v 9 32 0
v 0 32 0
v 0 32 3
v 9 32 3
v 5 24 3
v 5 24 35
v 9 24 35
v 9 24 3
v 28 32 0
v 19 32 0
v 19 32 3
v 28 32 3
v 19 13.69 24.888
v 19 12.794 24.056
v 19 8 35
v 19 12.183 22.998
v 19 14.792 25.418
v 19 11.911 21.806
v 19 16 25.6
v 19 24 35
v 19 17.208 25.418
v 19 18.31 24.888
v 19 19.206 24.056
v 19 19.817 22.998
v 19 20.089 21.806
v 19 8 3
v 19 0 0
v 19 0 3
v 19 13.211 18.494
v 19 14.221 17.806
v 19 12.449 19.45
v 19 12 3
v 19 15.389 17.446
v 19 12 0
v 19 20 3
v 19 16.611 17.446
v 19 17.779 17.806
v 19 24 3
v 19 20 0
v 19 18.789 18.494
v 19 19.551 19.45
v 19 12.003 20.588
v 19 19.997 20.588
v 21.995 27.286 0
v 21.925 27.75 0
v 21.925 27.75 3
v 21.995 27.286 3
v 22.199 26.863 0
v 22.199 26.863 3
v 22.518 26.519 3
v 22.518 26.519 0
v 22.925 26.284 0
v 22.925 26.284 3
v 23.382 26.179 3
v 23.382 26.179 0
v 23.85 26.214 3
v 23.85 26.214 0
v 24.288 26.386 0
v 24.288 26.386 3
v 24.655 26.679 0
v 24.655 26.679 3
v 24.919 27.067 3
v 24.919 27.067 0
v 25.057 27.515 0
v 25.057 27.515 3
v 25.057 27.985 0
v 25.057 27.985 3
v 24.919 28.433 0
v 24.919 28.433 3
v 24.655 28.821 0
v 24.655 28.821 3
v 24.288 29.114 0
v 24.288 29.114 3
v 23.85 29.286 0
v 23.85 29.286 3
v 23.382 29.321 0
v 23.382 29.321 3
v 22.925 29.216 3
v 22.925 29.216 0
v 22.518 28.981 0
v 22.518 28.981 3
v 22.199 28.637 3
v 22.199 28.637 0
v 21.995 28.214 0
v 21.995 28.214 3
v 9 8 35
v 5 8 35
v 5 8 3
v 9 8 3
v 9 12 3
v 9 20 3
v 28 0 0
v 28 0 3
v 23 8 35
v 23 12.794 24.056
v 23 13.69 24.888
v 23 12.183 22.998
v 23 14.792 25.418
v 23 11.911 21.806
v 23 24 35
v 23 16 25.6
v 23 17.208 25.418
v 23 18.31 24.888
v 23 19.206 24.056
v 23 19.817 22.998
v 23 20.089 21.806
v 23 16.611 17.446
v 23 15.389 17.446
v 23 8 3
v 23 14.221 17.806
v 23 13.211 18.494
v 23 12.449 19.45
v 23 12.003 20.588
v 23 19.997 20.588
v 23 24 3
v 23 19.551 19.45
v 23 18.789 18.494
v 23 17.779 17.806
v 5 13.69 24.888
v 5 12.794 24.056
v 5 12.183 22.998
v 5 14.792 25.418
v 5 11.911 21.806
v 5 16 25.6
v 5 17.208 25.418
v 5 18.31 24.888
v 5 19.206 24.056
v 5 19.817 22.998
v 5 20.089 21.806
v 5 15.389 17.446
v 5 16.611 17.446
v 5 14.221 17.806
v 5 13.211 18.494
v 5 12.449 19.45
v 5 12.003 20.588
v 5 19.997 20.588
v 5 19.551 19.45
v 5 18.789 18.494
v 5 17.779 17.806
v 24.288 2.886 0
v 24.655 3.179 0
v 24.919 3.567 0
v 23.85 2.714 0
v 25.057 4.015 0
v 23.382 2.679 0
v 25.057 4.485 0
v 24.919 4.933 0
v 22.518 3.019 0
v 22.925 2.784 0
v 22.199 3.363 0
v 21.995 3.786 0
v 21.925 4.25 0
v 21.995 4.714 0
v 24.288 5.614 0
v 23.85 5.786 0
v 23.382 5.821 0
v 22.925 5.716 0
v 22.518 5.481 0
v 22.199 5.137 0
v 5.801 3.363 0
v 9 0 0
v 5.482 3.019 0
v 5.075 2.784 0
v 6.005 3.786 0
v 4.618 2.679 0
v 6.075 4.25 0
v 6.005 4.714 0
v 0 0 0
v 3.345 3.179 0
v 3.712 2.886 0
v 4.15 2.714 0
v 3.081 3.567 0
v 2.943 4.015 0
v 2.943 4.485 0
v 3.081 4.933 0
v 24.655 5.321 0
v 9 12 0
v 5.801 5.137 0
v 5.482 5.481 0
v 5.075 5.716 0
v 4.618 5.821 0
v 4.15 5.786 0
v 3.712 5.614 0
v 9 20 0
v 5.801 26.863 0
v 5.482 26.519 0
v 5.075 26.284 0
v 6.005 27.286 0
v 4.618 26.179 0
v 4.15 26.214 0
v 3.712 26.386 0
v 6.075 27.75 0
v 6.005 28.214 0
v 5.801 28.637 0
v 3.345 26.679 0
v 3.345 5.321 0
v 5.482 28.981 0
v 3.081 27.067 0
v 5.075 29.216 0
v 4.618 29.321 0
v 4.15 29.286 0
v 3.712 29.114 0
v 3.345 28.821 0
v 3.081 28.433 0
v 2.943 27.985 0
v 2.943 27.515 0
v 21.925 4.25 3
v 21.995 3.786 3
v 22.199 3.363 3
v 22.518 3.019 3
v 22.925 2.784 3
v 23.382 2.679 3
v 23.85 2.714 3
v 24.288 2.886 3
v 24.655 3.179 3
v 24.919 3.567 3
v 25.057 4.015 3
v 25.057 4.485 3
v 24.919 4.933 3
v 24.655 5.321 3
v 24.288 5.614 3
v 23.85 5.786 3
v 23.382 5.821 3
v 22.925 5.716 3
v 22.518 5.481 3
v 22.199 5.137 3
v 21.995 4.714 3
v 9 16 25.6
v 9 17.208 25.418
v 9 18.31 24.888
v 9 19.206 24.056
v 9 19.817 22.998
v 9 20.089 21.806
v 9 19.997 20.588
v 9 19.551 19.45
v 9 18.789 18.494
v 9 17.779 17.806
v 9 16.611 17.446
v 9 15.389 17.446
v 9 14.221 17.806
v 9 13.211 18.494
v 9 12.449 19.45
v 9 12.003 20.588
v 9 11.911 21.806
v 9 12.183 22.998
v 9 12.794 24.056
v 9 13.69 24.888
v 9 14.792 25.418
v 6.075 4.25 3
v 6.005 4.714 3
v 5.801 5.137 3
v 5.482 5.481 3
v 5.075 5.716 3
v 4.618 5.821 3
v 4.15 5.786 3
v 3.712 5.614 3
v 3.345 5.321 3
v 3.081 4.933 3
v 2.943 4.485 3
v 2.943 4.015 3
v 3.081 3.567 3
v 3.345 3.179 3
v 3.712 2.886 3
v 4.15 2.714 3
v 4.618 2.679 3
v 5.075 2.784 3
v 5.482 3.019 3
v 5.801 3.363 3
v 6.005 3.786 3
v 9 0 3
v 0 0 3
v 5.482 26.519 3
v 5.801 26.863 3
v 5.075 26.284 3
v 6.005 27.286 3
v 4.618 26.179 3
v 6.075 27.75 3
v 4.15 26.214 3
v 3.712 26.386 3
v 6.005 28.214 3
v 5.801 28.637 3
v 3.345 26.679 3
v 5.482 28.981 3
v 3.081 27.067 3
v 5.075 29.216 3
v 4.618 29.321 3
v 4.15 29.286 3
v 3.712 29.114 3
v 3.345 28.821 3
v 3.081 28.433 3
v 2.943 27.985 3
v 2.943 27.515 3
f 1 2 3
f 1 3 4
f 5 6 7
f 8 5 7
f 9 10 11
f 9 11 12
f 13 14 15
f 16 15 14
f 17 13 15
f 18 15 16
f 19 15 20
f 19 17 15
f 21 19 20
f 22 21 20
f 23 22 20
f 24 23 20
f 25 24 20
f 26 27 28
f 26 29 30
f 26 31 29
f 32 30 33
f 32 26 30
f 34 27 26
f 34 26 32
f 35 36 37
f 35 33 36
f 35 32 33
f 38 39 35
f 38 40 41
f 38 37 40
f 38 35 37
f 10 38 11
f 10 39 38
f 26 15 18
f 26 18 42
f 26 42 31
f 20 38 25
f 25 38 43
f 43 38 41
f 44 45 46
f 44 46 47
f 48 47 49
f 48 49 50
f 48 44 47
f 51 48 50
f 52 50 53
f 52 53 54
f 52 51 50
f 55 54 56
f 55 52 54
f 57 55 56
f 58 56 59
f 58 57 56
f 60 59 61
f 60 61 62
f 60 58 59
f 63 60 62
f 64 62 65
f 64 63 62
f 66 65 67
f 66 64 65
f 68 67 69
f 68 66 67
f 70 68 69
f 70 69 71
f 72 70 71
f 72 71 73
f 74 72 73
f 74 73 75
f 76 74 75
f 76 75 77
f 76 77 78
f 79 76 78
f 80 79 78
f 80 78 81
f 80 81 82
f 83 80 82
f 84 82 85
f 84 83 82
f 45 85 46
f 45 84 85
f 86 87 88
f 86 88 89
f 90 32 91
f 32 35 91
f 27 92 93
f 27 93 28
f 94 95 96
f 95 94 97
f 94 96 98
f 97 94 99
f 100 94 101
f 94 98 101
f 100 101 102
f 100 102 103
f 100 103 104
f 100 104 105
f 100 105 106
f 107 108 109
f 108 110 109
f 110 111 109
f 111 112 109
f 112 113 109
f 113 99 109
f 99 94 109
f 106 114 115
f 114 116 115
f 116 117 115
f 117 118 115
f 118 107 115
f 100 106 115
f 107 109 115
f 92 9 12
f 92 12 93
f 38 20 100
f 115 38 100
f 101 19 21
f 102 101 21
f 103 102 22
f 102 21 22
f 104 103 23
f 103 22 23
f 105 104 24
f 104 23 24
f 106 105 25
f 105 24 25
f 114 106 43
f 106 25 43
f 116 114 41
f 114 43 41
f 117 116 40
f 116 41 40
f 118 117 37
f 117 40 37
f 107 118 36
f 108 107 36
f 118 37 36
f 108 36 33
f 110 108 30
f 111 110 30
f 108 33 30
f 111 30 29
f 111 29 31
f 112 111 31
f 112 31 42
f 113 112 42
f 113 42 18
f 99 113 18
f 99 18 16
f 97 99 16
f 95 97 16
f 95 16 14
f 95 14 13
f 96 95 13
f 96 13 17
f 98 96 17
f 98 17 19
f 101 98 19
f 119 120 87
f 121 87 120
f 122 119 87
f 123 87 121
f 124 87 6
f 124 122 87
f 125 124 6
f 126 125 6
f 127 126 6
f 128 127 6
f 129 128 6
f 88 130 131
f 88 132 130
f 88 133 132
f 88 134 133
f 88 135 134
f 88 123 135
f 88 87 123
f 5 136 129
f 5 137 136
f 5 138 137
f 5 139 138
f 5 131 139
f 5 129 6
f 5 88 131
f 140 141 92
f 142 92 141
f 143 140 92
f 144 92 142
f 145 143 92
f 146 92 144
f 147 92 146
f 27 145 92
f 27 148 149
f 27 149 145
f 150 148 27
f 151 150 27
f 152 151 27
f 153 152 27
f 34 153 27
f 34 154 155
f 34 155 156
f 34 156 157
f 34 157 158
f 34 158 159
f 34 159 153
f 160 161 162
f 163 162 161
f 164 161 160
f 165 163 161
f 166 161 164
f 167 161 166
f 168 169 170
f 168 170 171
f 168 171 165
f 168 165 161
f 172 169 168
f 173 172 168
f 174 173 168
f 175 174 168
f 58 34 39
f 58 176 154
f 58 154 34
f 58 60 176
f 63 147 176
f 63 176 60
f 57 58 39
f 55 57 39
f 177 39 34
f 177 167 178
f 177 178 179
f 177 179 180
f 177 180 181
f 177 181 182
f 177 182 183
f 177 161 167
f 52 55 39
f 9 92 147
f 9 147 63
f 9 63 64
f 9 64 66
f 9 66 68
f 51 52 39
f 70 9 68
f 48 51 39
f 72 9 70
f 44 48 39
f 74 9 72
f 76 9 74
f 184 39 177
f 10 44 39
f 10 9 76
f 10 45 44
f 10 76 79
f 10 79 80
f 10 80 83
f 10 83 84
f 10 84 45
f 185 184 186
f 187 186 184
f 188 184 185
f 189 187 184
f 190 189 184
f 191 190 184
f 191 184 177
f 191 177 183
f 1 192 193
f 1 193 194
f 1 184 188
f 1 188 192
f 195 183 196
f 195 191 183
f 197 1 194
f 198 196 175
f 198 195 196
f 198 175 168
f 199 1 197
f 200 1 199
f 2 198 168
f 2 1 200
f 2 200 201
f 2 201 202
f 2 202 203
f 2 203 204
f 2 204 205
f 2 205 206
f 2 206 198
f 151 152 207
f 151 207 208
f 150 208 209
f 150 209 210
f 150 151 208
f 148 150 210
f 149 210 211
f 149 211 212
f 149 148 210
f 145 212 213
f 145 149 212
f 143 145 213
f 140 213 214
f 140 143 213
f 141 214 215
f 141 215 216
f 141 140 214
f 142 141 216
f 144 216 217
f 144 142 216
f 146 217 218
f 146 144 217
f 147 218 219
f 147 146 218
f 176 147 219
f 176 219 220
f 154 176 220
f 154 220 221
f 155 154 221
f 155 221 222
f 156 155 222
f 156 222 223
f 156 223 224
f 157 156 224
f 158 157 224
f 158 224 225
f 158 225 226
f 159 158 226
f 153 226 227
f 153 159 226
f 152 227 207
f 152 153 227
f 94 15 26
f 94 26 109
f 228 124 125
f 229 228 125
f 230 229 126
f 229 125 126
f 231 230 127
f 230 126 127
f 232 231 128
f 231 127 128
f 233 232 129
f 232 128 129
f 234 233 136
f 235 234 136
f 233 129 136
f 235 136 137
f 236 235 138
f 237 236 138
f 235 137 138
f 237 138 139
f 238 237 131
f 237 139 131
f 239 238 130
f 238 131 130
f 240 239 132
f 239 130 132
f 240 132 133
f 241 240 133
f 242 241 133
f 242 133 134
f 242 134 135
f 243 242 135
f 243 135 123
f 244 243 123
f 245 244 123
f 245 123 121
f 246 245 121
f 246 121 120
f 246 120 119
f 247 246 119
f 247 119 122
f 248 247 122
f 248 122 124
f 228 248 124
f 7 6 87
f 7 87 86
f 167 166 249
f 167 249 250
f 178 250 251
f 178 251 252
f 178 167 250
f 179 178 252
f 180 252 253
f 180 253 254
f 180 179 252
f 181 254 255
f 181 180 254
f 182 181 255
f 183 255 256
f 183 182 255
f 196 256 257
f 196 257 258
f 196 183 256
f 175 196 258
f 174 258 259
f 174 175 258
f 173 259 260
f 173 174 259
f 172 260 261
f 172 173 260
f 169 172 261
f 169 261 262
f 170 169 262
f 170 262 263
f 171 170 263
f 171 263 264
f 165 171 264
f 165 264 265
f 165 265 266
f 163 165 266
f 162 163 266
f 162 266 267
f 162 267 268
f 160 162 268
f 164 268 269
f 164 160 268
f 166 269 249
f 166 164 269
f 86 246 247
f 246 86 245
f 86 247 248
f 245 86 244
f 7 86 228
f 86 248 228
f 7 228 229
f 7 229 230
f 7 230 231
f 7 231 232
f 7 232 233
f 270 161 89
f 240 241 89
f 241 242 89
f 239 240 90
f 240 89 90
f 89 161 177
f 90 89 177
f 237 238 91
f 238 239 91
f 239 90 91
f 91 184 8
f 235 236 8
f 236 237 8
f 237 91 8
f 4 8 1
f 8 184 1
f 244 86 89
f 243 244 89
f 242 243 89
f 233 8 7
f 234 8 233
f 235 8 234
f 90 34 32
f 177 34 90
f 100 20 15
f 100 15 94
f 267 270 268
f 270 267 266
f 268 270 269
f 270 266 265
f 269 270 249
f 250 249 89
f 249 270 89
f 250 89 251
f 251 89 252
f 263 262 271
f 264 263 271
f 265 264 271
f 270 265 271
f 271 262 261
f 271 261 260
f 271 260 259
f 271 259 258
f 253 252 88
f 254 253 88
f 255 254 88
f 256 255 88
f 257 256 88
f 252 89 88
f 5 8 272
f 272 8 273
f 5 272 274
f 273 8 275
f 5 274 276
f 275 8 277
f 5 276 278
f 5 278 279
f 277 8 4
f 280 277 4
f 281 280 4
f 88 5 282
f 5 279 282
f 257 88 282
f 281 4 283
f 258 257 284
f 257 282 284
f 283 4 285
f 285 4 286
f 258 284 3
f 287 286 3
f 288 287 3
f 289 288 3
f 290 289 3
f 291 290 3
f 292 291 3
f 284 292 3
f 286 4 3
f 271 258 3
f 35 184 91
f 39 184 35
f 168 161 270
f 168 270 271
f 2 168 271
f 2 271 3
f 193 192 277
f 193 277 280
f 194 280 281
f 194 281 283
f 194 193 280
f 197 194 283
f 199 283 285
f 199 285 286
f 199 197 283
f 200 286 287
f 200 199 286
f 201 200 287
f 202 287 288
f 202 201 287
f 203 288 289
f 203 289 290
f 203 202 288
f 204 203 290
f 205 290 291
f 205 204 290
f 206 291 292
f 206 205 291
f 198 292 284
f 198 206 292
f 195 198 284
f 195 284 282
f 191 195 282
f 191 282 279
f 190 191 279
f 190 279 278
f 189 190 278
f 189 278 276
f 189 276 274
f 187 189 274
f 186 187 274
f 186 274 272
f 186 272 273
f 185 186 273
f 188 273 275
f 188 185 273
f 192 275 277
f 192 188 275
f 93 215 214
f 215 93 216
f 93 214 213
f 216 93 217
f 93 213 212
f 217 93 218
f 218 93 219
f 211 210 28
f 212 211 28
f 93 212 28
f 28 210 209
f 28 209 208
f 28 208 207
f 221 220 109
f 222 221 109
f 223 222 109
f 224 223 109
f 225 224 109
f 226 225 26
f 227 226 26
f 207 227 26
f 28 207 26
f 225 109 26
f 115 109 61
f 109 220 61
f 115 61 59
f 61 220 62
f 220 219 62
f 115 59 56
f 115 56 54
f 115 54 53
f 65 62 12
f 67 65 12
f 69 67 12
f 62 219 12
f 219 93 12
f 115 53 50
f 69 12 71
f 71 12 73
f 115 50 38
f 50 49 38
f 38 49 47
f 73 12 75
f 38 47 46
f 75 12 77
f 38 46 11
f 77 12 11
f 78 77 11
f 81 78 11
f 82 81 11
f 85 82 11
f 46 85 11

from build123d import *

# Parameters (mm, degrees)
SKETCH1_R           = 1.575
BOSS_EXTRUDE1_DEPTH = 3
SKETCH2_W           = 4
SKETCH2_H           = 16
BOSS_EXTRUDE2_DEPTH = 32
SKETCH3_R           = 4.1
CUT_EXTRUDE1_DEPTH  = 35


with BuildPart() as part:
    # Sketch1 → Boss-Extrude1 (new body)
    with BuildSketch(Plane.XY):
        Polygon((0, 0), (0, 32), (9, 32), (9, 20), (19, 20), (19, 32), (28, 32), (28, 0), (19, 0), (19, 12), (9, 12), (9, 0), align=None)
        with Locations((4.5, 27.75)):
            Circle(SKETCH1_R, mode=Mode.SUBTRACT)
        with Locations((4.5, 4.25)):
            Circle(SKETCH1_R, mode=Mode.SUBTRACT)
        with Locations(Location((23.5, 4.25, 0), (0, 0, 180))):
            Circle(SKETCH1_R, mode=Mode.SUBTRACT)
        with Locations(Location((23.5, 27.75, 0), (0, 0, 180))):
            Circle(SKETCH1_R, mode=Mode.SUBTRACT)
    extrude(amount=BOSS_EXTRUDE1_DEPTH)

    # Sketch2 → Boss-Extrude2 (add)
    with BuildSketch(Plane.XY.offset(3)):
        with Locations((7, 16)):
            Rectangle(SKETCH2_W, SKETCH2_H)
        with Locations((21, 16)):
            Rectangle(SKETCH2_W, SKETCH2_H)
    extrude(amount=BOSS_EXTRUDE2_DEPTH)

    # Sketch3 → Cut-Extrude1 (cut)
    with BuildSketch(Plane.ZY.offset(-5)):
        with Locations((21.5, 16)):
            Circle(SKETCH3_R)
    extrude(amount=-CUT_EXTRUDE1_DEPTH, mode=Mode.SUBTRACT)


solid = part.part
